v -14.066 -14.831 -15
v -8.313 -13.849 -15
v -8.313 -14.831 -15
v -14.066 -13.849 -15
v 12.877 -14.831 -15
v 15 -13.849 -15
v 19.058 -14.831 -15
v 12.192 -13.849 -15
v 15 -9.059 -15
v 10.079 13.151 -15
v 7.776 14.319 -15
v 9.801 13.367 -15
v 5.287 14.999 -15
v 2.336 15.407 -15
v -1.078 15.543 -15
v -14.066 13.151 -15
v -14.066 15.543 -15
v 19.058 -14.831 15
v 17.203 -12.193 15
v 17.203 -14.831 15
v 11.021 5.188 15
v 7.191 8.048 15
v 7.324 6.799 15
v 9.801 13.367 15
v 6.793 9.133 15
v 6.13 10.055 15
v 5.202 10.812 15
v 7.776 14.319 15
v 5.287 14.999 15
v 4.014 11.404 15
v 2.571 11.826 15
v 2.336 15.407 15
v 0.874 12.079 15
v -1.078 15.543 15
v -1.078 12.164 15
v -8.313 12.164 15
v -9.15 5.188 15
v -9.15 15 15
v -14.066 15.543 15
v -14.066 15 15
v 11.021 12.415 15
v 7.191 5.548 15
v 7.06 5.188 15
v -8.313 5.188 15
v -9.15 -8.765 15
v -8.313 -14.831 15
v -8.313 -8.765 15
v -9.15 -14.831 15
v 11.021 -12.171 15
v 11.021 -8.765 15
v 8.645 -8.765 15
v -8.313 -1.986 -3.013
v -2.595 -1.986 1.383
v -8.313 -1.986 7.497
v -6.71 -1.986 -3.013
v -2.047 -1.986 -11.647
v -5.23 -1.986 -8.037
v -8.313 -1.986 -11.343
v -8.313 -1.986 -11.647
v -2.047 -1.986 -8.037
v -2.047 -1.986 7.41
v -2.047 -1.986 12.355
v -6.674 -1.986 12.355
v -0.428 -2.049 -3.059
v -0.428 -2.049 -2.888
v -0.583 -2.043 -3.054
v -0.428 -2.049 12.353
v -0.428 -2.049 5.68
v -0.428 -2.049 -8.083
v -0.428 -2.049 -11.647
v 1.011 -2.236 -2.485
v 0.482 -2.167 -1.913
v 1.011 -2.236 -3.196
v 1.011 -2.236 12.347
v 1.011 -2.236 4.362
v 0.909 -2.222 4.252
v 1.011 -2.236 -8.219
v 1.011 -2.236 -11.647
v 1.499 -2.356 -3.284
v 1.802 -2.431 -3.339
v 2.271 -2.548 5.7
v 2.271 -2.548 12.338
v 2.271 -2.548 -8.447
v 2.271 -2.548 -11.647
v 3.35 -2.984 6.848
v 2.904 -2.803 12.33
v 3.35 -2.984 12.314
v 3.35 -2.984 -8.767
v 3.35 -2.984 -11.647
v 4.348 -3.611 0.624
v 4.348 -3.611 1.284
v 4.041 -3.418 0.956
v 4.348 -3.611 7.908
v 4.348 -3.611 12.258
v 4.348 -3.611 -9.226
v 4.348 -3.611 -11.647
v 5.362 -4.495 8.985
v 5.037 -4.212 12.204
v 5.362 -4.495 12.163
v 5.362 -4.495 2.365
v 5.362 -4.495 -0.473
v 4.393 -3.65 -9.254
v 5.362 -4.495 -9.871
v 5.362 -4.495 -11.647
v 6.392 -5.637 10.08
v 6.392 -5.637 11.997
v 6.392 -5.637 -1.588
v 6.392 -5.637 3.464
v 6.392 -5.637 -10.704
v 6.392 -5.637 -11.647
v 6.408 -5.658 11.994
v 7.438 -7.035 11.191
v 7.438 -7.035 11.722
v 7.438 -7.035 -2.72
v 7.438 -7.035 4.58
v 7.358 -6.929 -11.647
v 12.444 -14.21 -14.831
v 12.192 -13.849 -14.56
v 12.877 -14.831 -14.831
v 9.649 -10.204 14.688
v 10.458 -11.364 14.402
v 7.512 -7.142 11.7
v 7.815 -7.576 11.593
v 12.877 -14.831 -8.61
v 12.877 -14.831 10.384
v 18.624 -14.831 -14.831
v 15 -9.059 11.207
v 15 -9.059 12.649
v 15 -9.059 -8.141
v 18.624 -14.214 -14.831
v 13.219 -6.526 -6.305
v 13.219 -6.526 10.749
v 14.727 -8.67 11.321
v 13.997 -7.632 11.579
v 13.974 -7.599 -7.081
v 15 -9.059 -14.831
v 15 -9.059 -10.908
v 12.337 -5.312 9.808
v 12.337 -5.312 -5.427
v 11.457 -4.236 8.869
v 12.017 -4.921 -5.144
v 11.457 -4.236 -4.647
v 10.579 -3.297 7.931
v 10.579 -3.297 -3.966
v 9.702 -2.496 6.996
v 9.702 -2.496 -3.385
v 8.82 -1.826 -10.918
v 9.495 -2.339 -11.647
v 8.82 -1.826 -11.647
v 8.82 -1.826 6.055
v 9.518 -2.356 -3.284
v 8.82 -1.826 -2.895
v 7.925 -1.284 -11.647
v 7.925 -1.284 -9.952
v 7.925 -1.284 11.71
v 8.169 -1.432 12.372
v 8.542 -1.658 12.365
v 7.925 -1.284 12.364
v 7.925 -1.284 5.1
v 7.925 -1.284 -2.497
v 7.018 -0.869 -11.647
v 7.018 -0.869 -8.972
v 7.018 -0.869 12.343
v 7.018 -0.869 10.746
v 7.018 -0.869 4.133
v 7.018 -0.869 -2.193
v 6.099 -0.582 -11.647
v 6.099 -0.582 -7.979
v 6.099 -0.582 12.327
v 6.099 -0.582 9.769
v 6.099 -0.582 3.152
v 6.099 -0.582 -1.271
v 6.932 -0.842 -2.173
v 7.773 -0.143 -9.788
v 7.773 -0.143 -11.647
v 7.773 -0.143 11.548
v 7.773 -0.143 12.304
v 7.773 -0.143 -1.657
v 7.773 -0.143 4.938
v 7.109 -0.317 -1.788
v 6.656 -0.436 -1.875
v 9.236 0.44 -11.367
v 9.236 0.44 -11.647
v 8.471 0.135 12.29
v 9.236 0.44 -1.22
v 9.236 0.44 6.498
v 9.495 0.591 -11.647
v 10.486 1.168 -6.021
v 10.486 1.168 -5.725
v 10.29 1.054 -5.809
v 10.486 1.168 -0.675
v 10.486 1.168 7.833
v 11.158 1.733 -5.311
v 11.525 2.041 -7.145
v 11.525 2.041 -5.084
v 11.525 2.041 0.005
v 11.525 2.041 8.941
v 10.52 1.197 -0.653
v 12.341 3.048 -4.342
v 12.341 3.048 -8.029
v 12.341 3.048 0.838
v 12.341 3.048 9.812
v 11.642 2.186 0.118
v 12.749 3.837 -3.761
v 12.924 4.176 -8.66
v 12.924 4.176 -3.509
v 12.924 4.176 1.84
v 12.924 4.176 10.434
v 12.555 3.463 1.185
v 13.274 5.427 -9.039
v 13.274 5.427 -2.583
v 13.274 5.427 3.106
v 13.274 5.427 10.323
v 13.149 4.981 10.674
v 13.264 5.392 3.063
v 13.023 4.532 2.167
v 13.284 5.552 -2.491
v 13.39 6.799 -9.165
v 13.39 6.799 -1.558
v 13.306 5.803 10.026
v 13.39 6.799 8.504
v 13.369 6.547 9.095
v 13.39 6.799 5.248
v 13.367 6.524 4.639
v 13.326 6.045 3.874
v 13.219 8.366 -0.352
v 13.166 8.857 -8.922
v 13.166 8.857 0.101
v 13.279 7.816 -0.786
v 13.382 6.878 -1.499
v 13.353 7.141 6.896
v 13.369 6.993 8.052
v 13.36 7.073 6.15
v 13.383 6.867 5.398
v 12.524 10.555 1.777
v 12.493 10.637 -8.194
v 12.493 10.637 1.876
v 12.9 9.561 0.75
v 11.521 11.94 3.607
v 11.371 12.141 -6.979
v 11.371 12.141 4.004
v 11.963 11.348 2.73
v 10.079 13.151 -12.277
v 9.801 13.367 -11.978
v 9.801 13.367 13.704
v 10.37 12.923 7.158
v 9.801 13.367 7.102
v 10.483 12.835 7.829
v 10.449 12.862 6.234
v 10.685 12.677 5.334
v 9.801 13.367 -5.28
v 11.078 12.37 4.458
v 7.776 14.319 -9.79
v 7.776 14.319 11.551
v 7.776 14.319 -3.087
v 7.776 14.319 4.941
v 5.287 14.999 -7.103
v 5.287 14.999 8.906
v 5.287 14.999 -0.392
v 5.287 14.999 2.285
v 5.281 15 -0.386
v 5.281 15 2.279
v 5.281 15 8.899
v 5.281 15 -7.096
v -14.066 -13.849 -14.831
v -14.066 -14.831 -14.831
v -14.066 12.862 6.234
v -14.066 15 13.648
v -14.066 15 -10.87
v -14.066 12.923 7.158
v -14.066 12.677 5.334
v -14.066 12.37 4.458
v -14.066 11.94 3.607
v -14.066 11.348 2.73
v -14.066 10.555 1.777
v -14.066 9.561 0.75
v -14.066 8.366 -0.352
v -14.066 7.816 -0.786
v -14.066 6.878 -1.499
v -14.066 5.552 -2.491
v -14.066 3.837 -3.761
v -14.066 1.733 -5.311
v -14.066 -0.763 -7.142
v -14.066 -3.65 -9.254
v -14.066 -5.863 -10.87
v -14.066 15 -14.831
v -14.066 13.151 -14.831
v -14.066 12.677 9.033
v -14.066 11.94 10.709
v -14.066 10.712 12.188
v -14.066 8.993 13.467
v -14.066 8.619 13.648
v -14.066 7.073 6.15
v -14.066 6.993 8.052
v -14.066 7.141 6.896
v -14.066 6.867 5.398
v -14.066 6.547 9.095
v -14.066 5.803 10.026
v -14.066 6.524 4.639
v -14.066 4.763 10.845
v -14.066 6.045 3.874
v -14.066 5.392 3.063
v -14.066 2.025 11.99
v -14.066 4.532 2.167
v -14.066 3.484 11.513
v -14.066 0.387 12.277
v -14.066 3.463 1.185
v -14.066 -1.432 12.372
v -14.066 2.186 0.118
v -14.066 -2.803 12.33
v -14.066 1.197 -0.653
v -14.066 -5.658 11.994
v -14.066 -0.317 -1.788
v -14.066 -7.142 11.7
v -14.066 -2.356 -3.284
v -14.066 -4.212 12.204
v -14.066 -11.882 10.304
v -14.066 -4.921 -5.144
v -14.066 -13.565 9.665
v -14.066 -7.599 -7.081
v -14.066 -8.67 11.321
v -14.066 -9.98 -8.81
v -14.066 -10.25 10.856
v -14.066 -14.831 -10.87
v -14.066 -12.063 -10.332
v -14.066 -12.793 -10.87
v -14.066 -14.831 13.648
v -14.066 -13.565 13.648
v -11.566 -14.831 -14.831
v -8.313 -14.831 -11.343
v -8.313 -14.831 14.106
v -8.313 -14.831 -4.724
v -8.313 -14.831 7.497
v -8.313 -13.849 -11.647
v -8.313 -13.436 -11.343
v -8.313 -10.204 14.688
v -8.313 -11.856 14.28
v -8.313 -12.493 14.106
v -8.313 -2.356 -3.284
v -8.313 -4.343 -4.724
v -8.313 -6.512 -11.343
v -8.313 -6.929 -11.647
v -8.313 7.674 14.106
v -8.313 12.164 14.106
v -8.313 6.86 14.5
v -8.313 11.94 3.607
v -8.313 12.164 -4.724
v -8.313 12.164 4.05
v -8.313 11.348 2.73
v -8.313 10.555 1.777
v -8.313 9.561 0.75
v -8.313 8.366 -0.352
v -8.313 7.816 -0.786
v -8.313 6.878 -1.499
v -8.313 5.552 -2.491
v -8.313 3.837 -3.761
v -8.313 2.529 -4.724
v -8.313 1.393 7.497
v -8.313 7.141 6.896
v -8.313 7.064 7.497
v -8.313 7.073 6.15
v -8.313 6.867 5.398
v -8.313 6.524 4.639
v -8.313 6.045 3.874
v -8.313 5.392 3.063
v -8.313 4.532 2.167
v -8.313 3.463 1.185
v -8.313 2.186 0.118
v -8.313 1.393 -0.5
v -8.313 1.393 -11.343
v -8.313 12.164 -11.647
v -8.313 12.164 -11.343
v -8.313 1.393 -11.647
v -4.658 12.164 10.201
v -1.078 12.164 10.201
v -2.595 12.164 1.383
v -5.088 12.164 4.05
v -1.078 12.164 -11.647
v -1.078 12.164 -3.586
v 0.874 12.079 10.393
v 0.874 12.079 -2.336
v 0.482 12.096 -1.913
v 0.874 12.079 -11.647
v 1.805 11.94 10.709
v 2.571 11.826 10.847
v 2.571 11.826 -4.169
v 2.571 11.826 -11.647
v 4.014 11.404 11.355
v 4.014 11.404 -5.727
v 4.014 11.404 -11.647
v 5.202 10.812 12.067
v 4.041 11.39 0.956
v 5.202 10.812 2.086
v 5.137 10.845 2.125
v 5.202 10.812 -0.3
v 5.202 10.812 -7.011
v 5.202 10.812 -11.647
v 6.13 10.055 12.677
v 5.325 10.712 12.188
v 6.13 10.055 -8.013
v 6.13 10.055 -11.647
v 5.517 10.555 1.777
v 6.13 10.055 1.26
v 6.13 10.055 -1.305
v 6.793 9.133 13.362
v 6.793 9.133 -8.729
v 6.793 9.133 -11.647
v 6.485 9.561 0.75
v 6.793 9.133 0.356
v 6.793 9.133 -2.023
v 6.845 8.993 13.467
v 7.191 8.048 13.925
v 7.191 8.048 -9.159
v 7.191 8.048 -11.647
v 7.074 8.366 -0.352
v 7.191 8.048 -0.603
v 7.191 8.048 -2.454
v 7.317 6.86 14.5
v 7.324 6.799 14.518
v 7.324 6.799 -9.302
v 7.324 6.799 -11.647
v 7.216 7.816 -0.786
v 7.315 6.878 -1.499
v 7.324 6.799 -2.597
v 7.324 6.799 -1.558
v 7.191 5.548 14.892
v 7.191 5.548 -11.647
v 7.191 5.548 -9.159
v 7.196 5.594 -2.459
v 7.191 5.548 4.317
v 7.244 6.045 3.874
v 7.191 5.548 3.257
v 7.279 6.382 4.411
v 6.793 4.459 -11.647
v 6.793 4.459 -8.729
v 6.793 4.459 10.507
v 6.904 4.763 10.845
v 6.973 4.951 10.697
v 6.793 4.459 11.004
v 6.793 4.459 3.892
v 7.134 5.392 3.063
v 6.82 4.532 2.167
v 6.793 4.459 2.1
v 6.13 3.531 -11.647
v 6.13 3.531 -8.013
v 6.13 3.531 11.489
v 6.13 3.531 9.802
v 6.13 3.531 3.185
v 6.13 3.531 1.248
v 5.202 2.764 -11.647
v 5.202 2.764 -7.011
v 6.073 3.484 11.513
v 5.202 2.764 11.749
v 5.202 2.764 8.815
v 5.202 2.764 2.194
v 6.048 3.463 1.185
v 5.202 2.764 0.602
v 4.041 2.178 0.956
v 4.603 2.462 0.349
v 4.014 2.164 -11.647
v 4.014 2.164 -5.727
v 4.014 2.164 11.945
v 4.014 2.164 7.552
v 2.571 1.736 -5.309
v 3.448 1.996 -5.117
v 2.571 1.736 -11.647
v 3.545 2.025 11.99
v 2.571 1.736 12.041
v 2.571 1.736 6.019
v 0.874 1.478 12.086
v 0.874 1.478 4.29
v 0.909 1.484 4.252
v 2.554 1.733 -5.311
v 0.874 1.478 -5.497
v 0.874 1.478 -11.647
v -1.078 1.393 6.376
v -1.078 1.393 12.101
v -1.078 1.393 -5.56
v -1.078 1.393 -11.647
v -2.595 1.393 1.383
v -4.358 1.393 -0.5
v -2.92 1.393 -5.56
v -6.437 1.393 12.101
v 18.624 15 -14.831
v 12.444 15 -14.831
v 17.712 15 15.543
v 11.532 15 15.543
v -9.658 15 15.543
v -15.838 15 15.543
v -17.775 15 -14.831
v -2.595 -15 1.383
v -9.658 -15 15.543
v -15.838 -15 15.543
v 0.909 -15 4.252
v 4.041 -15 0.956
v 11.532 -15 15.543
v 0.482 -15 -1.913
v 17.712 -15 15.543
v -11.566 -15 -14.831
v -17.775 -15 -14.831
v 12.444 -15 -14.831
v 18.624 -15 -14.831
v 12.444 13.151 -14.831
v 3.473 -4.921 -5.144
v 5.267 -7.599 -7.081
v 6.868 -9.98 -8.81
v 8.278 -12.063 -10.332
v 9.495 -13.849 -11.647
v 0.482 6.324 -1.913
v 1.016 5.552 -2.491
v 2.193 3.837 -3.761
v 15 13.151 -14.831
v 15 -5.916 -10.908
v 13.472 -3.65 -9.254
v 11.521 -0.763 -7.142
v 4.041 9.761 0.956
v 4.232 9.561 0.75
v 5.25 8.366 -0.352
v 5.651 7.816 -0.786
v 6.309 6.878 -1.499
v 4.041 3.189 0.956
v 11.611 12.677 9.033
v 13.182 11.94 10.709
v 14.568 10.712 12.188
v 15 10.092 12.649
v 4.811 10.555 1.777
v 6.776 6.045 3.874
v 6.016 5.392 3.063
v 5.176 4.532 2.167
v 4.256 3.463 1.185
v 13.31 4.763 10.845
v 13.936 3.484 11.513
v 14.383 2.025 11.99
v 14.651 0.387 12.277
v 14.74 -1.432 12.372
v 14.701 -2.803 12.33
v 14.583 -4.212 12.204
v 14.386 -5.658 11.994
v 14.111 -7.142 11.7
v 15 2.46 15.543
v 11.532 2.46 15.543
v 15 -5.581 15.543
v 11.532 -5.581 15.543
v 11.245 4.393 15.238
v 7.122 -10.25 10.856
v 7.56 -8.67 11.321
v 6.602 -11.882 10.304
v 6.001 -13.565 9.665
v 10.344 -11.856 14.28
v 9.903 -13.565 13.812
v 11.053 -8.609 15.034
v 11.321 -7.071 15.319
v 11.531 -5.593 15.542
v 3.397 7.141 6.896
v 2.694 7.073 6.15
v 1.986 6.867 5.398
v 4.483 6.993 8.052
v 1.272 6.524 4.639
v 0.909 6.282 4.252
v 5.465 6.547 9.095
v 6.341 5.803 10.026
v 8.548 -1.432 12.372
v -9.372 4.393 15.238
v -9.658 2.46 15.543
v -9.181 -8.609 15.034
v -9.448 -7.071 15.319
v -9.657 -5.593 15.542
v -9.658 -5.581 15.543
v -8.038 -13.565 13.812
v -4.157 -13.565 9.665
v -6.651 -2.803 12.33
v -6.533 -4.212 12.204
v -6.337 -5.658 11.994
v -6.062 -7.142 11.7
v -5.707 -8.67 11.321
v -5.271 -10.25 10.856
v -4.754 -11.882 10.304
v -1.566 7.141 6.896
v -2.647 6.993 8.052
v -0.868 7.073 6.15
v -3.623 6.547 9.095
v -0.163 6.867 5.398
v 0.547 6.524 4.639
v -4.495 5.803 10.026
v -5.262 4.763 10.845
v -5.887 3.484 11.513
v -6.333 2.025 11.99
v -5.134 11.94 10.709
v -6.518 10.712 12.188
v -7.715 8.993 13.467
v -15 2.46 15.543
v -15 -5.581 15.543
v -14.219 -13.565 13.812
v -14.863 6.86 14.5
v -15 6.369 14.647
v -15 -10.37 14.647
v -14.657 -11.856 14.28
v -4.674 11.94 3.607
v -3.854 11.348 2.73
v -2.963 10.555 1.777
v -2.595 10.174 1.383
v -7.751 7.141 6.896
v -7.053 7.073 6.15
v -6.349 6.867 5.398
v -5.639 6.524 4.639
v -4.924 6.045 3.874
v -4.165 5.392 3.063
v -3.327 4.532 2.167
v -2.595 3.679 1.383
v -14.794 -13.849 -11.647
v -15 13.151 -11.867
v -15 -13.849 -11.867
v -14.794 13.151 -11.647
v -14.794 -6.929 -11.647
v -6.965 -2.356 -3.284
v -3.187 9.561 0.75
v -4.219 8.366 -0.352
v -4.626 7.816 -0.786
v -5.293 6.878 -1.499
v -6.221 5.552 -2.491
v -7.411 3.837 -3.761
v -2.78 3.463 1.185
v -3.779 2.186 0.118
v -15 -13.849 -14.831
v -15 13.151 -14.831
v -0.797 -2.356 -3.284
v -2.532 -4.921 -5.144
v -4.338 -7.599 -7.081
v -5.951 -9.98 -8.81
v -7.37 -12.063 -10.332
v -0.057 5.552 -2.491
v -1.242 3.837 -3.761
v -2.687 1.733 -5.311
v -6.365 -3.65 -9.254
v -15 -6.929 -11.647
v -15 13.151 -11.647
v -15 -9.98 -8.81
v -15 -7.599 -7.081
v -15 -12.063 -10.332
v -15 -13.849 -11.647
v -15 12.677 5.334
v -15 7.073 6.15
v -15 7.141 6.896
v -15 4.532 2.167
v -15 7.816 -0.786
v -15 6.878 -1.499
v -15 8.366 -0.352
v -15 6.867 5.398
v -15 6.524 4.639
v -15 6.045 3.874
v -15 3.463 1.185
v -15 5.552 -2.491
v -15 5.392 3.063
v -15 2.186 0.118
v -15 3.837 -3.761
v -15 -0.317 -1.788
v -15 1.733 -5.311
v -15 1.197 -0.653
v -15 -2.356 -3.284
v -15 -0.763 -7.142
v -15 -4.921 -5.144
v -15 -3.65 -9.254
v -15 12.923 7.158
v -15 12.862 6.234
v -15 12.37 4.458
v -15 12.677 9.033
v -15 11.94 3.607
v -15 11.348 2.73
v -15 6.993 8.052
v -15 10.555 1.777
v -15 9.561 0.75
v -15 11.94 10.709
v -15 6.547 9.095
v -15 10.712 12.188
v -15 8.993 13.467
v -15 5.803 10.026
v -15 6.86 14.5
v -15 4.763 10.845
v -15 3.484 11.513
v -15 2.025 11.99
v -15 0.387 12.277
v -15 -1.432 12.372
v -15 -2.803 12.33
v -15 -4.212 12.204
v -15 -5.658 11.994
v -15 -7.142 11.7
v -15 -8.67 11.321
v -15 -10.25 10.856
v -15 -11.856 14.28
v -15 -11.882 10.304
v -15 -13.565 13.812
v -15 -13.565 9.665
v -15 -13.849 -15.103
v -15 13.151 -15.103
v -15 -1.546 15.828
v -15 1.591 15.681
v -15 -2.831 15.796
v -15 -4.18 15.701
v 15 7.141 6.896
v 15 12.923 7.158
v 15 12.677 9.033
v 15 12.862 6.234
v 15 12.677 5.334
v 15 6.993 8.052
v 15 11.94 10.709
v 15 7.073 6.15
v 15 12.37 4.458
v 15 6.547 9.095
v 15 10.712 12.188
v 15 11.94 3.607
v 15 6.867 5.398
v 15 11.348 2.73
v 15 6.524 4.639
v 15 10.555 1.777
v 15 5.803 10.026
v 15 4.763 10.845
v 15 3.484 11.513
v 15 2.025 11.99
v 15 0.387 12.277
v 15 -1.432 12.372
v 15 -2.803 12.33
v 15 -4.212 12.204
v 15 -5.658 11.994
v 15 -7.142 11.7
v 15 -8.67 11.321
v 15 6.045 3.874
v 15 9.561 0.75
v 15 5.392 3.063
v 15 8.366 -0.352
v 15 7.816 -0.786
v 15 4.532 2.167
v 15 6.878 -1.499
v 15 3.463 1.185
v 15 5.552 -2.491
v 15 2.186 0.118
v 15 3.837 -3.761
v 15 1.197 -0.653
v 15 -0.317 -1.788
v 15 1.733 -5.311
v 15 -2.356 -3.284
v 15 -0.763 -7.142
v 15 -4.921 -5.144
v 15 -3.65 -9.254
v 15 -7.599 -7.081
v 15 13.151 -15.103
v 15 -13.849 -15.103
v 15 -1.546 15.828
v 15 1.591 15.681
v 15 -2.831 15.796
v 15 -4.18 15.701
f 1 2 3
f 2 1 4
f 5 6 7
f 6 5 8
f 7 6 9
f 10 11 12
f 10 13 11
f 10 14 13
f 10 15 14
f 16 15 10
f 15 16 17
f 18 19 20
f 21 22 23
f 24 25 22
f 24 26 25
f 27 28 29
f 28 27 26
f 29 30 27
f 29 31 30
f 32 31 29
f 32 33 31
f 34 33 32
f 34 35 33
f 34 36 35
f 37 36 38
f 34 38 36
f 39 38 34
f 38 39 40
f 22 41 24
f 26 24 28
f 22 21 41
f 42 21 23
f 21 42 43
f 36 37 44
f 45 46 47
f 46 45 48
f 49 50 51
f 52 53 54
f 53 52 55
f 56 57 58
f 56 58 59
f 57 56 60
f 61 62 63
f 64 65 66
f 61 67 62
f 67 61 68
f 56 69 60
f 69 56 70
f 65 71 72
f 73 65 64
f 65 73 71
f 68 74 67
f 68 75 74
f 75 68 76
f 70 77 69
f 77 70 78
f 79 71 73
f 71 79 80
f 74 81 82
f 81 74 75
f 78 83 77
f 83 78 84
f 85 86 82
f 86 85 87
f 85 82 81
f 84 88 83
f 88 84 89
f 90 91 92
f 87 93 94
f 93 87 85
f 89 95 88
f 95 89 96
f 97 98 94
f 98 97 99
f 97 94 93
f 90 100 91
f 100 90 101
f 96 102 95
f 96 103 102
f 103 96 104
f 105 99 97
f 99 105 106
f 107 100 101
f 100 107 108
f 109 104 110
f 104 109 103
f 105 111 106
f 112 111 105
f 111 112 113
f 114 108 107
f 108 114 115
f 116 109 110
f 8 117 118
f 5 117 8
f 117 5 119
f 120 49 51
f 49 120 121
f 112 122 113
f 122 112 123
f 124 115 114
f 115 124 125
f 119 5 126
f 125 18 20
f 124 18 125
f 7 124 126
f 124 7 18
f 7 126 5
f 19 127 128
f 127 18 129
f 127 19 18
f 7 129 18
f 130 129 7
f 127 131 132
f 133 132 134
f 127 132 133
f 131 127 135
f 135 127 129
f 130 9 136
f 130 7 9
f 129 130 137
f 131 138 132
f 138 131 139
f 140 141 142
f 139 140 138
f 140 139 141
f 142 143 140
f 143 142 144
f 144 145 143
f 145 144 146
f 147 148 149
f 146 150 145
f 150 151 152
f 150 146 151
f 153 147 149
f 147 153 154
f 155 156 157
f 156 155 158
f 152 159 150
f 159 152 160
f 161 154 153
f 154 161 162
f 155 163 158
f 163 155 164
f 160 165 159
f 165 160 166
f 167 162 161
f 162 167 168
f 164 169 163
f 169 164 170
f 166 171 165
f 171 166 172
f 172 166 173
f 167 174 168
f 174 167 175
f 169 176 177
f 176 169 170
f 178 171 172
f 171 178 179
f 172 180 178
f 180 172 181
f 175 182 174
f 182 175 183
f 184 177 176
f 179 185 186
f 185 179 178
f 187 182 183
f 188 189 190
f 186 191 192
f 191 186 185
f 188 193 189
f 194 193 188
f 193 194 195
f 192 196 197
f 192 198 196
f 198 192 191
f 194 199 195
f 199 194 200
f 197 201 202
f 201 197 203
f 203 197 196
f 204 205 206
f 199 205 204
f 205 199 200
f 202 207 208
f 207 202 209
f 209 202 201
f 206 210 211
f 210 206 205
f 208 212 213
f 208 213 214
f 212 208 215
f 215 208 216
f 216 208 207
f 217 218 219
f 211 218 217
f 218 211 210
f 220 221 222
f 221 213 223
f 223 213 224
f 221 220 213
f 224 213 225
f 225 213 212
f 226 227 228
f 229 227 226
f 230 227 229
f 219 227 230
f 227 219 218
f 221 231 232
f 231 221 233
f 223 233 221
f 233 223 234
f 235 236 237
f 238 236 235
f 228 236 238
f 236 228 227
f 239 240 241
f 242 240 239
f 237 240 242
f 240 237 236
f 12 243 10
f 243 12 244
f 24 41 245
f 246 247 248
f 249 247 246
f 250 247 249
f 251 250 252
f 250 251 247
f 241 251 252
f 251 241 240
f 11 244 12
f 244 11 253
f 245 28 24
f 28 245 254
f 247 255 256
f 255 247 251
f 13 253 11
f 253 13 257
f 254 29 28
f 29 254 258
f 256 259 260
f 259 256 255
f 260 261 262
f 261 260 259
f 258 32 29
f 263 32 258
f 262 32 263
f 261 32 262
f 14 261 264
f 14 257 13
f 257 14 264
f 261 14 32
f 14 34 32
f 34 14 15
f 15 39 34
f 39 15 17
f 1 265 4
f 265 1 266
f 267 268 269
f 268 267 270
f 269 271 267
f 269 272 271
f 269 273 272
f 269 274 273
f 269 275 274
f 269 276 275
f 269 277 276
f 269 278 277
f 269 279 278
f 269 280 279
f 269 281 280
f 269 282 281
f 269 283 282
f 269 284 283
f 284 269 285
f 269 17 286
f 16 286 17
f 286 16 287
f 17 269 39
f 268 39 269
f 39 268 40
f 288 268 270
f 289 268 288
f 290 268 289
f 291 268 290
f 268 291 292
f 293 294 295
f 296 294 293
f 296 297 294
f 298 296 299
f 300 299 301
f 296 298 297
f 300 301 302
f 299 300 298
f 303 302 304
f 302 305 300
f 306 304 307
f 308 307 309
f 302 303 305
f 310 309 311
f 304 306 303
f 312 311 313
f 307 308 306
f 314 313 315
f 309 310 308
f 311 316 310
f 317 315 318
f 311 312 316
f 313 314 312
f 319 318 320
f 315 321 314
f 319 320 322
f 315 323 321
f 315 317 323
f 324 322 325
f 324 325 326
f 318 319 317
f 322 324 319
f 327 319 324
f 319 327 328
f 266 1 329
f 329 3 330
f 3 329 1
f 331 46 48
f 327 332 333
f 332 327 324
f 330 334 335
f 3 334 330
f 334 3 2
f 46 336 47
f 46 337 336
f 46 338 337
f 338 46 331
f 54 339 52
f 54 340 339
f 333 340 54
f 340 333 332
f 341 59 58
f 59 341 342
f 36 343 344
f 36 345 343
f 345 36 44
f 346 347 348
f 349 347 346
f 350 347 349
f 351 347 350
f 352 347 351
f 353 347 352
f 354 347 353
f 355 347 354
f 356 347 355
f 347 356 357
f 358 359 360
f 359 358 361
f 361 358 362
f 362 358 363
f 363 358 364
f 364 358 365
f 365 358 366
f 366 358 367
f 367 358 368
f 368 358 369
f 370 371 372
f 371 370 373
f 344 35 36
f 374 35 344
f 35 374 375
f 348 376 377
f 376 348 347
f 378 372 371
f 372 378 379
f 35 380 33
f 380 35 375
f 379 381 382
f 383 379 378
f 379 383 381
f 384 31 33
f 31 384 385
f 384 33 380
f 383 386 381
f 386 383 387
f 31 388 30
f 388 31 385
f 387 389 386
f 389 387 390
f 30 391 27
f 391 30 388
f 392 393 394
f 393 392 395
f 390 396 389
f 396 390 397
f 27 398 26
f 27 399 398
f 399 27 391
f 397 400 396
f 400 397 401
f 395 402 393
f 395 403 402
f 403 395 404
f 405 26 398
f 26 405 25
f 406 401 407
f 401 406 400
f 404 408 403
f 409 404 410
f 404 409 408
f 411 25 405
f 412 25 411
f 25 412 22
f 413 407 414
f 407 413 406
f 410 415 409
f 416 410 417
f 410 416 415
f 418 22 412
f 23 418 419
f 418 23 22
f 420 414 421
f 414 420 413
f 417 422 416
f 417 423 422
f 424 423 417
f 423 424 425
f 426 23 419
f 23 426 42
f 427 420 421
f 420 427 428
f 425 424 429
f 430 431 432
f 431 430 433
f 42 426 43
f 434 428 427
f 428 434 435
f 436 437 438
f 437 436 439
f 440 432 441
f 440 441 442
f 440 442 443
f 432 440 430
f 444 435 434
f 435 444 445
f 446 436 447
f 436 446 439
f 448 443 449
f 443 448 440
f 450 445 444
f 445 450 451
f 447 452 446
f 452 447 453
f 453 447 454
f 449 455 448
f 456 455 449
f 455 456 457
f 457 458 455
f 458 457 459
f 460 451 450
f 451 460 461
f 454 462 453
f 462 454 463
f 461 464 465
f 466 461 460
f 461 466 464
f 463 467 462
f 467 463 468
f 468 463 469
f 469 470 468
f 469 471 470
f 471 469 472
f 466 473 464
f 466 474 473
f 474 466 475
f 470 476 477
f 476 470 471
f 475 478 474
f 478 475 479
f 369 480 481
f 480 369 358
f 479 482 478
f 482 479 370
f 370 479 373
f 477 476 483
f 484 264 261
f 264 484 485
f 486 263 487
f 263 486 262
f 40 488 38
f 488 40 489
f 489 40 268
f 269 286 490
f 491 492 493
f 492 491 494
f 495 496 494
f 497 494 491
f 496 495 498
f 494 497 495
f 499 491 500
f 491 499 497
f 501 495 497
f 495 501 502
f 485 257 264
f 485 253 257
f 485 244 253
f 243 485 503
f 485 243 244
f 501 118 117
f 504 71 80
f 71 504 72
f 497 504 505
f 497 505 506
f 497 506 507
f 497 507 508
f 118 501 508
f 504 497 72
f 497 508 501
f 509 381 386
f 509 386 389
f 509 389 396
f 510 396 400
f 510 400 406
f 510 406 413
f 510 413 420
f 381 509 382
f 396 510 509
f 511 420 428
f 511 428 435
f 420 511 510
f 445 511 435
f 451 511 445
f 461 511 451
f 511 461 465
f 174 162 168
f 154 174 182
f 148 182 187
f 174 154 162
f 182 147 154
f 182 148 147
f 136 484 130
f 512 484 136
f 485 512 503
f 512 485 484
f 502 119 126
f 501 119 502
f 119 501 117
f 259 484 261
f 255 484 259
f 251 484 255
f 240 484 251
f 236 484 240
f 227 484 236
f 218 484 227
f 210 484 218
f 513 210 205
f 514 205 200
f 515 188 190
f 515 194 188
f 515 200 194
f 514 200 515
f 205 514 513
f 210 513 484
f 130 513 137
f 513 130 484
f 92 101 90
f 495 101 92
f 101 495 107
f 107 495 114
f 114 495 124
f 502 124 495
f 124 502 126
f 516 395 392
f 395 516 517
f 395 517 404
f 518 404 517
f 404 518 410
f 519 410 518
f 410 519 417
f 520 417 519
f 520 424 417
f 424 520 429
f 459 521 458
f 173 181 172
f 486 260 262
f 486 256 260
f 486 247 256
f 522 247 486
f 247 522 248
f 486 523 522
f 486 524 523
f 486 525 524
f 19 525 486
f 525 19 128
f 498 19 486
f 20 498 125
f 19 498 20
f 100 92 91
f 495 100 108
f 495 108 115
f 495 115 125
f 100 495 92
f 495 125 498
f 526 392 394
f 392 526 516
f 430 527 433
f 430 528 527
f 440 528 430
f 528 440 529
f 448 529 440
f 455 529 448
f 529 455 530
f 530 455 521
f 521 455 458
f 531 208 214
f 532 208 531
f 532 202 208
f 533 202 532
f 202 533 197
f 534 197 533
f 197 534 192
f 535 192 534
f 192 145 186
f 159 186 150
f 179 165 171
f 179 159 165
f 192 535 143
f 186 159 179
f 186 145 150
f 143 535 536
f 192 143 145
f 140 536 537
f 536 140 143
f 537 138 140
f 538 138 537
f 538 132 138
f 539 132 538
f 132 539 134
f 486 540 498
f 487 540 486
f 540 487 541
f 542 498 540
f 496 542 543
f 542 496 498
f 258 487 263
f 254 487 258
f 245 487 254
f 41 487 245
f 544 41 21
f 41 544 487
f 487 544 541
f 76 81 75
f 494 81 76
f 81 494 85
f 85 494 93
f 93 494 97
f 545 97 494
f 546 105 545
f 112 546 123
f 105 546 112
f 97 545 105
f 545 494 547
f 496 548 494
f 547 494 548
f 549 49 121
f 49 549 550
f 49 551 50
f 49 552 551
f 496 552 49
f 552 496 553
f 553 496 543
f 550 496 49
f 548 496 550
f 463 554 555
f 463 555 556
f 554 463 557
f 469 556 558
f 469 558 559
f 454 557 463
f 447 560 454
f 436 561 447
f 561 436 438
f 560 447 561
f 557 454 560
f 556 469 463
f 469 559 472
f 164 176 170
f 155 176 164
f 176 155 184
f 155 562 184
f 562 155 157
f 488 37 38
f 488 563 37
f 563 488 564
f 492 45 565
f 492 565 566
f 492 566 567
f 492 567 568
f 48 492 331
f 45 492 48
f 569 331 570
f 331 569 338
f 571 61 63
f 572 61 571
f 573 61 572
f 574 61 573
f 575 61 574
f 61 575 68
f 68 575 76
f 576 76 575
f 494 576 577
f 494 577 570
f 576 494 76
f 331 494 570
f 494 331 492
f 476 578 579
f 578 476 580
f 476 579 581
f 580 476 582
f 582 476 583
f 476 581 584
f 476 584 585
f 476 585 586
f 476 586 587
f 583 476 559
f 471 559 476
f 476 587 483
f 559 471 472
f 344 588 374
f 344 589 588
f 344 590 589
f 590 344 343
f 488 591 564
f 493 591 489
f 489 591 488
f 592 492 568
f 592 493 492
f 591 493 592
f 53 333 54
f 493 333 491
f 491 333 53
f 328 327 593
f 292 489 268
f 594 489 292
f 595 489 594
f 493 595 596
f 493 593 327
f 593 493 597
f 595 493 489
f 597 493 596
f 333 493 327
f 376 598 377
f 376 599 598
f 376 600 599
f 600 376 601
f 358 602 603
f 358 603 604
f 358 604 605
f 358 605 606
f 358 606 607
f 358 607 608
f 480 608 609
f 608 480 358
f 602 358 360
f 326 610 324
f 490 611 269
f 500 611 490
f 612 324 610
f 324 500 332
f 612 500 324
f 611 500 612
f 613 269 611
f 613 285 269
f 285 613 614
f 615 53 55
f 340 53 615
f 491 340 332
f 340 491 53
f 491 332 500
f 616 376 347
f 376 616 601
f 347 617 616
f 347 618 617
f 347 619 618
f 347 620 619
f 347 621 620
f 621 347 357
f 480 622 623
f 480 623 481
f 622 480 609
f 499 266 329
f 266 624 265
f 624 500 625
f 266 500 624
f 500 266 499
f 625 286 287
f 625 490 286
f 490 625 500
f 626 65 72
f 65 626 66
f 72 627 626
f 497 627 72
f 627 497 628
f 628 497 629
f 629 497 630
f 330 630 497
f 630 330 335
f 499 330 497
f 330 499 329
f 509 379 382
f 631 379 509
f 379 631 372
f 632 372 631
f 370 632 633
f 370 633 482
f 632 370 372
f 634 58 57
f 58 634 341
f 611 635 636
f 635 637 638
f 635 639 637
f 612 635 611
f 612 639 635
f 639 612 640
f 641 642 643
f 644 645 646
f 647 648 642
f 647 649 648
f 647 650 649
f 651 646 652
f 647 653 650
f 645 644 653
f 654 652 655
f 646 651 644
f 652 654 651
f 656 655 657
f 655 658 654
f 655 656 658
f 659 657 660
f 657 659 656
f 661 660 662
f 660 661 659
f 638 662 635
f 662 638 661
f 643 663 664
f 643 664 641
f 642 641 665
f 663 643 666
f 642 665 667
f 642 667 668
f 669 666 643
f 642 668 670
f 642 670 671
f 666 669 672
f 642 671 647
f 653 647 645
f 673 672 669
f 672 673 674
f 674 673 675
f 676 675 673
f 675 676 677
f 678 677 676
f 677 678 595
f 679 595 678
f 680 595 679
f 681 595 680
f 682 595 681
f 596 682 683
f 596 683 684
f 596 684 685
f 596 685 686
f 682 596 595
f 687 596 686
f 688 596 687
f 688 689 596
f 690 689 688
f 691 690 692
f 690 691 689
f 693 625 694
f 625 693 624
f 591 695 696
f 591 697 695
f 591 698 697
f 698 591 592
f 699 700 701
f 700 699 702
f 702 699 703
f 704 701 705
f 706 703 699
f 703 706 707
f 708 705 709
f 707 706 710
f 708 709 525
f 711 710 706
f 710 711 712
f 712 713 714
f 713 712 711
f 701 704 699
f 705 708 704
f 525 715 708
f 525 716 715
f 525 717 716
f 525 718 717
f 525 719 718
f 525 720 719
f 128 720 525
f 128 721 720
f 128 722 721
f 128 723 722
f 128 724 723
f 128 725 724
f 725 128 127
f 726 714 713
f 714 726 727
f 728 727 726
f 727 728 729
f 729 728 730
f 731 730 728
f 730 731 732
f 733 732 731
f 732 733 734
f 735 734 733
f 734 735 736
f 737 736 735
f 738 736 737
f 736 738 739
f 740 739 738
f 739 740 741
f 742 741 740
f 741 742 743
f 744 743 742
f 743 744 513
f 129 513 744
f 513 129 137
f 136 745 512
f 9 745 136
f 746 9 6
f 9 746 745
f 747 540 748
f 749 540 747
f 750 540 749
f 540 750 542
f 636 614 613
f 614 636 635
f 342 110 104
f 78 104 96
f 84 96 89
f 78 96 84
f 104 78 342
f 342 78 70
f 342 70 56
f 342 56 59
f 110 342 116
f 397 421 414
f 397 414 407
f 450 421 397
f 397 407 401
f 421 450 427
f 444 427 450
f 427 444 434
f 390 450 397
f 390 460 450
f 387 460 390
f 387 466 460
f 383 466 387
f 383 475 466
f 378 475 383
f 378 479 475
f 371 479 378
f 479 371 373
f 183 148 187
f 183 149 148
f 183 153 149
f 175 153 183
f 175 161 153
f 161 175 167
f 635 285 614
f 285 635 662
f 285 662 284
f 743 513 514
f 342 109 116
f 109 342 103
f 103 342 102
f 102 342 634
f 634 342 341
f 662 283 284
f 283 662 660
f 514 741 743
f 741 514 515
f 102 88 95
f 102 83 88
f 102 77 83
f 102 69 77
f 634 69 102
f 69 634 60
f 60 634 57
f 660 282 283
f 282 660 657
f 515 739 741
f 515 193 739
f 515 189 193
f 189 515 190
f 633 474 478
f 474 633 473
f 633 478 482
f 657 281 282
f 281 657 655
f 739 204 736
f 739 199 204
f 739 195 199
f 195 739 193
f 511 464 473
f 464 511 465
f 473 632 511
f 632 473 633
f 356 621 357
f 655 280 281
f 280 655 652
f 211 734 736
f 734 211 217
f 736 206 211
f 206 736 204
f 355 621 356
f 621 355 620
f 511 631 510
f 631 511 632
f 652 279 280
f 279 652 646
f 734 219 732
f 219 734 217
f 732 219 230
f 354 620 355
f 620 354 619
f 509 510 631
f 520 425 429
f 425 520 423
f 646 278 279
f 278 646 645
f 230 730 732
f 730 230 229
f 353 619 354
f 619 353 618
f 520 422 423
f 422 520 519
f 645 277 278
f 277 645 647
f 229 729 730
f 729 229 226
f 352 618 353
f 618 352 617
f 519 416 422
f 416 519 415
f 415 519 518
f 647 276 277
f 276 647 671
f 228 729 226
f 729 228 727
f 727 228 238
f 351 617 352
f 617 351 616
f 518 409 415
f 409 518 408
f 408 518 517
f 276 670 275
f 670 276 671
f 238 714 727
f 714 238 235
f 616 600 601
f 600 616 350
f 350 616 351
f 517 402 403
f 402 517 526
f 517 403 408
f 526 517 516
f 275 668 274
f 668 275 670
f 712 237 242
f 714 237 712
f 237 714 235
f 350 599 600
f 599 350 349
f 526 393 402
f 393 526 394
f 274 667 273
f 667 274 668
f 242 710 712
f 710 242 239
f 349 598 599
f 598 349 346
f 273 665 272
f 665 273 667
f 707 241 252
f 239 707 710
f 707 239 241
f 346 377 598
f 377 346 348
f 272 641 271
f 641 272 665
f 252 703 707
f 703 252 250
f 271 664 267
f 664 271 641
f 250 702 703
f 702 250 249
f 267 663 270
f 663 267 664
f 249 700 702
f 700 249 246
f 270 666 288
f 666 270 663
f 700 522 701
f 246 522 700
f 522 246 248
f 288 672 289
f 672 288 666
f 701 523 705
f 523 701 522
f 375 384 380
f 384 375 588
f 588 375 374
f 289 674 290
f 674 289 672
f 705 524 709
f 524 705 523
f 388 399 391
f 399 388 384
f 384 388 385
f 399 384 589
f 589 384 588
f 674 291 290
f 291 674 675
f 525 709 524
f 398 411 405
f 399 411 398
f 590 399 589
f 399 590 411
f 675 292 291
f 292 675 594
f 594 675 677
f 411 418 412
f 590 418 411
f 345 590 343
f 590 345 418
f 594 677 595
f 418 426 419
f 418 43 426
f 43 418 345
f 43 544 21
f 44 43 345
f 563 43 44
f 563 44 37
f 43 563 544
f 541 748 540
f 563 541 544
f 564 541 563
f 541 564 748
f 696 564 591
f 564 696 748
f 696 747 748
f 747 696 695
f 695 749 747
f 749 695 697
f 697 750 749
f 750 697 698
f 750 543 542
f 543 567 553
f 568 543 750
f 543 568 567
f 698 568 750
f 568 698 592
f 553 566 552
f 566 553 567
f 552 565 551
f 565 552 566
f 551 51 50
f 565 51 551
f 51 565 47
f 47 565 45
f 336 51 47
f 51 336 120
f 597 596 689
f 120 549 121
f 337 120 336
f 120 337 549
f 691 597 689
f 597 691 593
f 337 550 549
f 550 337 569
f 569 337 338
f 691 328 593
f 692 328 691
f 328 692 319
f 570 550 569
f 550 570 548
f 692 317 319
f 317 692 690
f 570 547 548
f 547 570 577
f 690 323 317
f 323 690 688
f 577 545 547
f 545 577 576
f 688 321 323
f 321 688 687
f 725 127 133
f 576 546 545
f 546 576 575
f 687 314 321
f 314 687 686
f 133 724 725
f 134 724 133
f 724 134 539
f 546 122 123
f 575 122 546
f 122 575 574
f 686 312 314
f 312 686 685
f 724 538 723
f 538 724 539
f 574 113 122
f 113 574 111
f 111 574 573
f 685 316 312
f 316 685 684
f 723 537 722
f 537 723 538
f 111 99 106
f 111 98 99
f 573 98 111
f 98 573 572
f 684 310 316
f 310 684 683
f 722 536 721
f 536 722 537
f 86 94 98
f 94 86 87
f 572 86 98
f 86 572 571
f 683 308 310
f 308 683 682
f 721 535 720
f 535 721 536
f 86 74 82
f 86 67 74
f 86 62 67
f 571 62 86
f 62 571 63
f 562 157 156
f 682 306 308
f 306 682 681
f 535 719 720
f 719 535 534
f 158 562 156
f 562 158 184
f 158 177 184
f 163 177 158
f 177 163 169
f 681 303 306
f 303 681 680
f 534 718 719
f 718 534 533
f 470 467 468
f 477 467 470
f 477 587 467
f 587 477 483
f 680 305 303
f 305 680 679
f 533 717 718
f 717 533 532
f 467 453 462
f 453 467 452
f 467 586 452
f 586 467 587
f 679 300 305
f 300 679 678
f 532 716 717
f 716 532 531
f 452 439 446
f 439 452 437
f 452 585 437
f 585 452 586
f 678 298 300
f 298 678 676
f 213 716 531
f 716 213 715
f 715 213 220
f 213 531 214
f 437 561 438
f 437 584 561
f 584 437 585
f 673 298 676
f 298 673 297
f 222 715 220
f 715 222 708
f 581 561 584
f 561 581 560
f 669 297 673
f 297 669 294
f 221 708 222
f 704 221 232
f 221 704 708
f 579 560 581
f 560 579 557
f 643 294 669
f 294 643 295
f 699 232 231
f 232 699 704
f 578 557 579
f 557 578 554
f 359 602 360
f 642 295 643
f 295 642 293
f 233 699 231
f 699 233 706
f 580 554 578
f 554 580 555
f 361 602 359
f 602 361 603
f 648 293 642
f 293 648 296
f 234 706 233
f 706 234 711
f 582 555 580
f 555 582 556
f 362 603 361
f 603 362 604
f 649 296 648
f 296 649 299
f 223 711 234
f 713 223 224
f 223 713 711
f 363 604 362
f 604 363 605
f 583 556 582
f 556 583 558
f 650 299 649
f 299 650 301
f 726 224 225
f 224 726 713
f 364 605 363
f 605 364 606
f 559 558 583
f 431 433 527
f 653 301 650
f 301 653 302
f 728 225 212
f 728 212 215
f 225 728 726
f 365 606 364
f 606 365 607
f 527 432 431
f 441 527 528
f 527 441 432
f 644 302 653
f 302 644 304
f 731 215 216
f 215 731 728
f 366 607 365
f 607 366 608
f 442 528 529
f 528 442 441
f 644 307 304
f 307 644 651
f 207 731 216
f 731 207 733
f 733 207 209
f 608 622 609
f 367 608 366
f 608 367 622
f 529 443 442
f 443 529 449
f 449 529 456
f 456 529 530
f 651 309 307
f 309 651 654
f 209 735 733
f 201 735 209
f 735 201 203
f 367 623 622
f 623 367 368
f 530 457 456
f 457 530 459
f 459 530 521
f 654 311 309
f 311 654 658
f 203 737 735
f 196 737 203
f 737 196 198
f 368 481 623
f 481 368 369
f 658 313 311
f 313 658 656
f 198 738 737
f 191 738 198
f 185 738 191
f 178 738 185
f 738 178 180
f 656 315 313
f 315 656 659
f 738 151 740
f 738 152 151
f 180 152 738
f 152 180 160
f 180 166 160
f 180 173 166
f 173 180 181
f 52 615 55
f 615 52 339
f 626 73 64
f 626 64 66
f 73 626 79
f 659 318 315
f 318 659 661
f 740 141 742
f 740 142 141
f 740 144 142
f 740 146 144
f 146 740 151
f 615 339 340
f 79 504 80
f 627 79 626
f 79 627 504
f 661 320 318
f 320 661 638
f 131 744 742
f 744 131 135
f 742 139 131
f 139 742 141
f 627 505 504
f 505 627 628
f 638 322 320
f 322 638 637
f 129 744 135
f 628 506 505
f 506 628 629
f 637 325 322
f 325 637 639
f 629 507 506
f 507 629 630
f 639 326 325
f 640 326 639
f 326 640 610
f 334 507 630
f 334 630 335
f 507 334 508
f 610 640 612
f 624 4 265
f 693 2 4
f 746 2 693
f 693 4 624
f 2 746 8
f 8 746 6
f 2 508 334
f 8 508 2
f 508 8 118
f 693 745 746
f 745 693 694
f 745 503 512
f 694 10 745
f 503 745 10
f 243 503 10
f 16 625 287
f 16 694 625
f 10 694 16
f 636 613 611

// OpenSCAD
monogram = "RX2";
size = 30;

//Word("Calibri");
Union("Calibri");
//Difference("Calibri");
//Intersection("Impact");

module Word(font) {
  LetterBlock(monogram[0], font);
  translate([size,0,0]) LetterBlock(monogram[1], font);
  translate([size*2,0,0]) LetterBlock(monogram[2], font);
}

module Union(font) {
  union() {
    LetterBlock(monogram[0], font);
    rotate([90,0,0]) LetterBlock(monogram[1], font);
    rotate([90, 0, 90]) LetterBlock(monogram[2], font);
  }
}

module Intersection(font) {
  intersection() {
    LetterBlock(monogram[0], font);
    rotate([90,0,0]) LetterBlock(monogram[1], font);
    rotate([90, 0, 90]) LetterBlock(monogram[2], font);
  }
}

module Difference(font) {
  difference() {
    cube([size*.99,size*.99,size*.99], true);
    cube([size*.75,size*.75,size*.75], true);
    LetterBlock(monogram[0], font);
    rotate([90,0,0]) LetterBlock(monogram[1], font);
    rotate([90, 0, 90]) LetterBlock(monogram[2], font);
  }
}

module LetterBlock(letter, font) {
  scale([1.4,1,1]) {
    translate([0,0,-size/2]) {
      linear_extrude(height=size, convexity=4) {
        text(letter, size=size, font=font, halign="center", valign="center");
      }
    }
  }
}
